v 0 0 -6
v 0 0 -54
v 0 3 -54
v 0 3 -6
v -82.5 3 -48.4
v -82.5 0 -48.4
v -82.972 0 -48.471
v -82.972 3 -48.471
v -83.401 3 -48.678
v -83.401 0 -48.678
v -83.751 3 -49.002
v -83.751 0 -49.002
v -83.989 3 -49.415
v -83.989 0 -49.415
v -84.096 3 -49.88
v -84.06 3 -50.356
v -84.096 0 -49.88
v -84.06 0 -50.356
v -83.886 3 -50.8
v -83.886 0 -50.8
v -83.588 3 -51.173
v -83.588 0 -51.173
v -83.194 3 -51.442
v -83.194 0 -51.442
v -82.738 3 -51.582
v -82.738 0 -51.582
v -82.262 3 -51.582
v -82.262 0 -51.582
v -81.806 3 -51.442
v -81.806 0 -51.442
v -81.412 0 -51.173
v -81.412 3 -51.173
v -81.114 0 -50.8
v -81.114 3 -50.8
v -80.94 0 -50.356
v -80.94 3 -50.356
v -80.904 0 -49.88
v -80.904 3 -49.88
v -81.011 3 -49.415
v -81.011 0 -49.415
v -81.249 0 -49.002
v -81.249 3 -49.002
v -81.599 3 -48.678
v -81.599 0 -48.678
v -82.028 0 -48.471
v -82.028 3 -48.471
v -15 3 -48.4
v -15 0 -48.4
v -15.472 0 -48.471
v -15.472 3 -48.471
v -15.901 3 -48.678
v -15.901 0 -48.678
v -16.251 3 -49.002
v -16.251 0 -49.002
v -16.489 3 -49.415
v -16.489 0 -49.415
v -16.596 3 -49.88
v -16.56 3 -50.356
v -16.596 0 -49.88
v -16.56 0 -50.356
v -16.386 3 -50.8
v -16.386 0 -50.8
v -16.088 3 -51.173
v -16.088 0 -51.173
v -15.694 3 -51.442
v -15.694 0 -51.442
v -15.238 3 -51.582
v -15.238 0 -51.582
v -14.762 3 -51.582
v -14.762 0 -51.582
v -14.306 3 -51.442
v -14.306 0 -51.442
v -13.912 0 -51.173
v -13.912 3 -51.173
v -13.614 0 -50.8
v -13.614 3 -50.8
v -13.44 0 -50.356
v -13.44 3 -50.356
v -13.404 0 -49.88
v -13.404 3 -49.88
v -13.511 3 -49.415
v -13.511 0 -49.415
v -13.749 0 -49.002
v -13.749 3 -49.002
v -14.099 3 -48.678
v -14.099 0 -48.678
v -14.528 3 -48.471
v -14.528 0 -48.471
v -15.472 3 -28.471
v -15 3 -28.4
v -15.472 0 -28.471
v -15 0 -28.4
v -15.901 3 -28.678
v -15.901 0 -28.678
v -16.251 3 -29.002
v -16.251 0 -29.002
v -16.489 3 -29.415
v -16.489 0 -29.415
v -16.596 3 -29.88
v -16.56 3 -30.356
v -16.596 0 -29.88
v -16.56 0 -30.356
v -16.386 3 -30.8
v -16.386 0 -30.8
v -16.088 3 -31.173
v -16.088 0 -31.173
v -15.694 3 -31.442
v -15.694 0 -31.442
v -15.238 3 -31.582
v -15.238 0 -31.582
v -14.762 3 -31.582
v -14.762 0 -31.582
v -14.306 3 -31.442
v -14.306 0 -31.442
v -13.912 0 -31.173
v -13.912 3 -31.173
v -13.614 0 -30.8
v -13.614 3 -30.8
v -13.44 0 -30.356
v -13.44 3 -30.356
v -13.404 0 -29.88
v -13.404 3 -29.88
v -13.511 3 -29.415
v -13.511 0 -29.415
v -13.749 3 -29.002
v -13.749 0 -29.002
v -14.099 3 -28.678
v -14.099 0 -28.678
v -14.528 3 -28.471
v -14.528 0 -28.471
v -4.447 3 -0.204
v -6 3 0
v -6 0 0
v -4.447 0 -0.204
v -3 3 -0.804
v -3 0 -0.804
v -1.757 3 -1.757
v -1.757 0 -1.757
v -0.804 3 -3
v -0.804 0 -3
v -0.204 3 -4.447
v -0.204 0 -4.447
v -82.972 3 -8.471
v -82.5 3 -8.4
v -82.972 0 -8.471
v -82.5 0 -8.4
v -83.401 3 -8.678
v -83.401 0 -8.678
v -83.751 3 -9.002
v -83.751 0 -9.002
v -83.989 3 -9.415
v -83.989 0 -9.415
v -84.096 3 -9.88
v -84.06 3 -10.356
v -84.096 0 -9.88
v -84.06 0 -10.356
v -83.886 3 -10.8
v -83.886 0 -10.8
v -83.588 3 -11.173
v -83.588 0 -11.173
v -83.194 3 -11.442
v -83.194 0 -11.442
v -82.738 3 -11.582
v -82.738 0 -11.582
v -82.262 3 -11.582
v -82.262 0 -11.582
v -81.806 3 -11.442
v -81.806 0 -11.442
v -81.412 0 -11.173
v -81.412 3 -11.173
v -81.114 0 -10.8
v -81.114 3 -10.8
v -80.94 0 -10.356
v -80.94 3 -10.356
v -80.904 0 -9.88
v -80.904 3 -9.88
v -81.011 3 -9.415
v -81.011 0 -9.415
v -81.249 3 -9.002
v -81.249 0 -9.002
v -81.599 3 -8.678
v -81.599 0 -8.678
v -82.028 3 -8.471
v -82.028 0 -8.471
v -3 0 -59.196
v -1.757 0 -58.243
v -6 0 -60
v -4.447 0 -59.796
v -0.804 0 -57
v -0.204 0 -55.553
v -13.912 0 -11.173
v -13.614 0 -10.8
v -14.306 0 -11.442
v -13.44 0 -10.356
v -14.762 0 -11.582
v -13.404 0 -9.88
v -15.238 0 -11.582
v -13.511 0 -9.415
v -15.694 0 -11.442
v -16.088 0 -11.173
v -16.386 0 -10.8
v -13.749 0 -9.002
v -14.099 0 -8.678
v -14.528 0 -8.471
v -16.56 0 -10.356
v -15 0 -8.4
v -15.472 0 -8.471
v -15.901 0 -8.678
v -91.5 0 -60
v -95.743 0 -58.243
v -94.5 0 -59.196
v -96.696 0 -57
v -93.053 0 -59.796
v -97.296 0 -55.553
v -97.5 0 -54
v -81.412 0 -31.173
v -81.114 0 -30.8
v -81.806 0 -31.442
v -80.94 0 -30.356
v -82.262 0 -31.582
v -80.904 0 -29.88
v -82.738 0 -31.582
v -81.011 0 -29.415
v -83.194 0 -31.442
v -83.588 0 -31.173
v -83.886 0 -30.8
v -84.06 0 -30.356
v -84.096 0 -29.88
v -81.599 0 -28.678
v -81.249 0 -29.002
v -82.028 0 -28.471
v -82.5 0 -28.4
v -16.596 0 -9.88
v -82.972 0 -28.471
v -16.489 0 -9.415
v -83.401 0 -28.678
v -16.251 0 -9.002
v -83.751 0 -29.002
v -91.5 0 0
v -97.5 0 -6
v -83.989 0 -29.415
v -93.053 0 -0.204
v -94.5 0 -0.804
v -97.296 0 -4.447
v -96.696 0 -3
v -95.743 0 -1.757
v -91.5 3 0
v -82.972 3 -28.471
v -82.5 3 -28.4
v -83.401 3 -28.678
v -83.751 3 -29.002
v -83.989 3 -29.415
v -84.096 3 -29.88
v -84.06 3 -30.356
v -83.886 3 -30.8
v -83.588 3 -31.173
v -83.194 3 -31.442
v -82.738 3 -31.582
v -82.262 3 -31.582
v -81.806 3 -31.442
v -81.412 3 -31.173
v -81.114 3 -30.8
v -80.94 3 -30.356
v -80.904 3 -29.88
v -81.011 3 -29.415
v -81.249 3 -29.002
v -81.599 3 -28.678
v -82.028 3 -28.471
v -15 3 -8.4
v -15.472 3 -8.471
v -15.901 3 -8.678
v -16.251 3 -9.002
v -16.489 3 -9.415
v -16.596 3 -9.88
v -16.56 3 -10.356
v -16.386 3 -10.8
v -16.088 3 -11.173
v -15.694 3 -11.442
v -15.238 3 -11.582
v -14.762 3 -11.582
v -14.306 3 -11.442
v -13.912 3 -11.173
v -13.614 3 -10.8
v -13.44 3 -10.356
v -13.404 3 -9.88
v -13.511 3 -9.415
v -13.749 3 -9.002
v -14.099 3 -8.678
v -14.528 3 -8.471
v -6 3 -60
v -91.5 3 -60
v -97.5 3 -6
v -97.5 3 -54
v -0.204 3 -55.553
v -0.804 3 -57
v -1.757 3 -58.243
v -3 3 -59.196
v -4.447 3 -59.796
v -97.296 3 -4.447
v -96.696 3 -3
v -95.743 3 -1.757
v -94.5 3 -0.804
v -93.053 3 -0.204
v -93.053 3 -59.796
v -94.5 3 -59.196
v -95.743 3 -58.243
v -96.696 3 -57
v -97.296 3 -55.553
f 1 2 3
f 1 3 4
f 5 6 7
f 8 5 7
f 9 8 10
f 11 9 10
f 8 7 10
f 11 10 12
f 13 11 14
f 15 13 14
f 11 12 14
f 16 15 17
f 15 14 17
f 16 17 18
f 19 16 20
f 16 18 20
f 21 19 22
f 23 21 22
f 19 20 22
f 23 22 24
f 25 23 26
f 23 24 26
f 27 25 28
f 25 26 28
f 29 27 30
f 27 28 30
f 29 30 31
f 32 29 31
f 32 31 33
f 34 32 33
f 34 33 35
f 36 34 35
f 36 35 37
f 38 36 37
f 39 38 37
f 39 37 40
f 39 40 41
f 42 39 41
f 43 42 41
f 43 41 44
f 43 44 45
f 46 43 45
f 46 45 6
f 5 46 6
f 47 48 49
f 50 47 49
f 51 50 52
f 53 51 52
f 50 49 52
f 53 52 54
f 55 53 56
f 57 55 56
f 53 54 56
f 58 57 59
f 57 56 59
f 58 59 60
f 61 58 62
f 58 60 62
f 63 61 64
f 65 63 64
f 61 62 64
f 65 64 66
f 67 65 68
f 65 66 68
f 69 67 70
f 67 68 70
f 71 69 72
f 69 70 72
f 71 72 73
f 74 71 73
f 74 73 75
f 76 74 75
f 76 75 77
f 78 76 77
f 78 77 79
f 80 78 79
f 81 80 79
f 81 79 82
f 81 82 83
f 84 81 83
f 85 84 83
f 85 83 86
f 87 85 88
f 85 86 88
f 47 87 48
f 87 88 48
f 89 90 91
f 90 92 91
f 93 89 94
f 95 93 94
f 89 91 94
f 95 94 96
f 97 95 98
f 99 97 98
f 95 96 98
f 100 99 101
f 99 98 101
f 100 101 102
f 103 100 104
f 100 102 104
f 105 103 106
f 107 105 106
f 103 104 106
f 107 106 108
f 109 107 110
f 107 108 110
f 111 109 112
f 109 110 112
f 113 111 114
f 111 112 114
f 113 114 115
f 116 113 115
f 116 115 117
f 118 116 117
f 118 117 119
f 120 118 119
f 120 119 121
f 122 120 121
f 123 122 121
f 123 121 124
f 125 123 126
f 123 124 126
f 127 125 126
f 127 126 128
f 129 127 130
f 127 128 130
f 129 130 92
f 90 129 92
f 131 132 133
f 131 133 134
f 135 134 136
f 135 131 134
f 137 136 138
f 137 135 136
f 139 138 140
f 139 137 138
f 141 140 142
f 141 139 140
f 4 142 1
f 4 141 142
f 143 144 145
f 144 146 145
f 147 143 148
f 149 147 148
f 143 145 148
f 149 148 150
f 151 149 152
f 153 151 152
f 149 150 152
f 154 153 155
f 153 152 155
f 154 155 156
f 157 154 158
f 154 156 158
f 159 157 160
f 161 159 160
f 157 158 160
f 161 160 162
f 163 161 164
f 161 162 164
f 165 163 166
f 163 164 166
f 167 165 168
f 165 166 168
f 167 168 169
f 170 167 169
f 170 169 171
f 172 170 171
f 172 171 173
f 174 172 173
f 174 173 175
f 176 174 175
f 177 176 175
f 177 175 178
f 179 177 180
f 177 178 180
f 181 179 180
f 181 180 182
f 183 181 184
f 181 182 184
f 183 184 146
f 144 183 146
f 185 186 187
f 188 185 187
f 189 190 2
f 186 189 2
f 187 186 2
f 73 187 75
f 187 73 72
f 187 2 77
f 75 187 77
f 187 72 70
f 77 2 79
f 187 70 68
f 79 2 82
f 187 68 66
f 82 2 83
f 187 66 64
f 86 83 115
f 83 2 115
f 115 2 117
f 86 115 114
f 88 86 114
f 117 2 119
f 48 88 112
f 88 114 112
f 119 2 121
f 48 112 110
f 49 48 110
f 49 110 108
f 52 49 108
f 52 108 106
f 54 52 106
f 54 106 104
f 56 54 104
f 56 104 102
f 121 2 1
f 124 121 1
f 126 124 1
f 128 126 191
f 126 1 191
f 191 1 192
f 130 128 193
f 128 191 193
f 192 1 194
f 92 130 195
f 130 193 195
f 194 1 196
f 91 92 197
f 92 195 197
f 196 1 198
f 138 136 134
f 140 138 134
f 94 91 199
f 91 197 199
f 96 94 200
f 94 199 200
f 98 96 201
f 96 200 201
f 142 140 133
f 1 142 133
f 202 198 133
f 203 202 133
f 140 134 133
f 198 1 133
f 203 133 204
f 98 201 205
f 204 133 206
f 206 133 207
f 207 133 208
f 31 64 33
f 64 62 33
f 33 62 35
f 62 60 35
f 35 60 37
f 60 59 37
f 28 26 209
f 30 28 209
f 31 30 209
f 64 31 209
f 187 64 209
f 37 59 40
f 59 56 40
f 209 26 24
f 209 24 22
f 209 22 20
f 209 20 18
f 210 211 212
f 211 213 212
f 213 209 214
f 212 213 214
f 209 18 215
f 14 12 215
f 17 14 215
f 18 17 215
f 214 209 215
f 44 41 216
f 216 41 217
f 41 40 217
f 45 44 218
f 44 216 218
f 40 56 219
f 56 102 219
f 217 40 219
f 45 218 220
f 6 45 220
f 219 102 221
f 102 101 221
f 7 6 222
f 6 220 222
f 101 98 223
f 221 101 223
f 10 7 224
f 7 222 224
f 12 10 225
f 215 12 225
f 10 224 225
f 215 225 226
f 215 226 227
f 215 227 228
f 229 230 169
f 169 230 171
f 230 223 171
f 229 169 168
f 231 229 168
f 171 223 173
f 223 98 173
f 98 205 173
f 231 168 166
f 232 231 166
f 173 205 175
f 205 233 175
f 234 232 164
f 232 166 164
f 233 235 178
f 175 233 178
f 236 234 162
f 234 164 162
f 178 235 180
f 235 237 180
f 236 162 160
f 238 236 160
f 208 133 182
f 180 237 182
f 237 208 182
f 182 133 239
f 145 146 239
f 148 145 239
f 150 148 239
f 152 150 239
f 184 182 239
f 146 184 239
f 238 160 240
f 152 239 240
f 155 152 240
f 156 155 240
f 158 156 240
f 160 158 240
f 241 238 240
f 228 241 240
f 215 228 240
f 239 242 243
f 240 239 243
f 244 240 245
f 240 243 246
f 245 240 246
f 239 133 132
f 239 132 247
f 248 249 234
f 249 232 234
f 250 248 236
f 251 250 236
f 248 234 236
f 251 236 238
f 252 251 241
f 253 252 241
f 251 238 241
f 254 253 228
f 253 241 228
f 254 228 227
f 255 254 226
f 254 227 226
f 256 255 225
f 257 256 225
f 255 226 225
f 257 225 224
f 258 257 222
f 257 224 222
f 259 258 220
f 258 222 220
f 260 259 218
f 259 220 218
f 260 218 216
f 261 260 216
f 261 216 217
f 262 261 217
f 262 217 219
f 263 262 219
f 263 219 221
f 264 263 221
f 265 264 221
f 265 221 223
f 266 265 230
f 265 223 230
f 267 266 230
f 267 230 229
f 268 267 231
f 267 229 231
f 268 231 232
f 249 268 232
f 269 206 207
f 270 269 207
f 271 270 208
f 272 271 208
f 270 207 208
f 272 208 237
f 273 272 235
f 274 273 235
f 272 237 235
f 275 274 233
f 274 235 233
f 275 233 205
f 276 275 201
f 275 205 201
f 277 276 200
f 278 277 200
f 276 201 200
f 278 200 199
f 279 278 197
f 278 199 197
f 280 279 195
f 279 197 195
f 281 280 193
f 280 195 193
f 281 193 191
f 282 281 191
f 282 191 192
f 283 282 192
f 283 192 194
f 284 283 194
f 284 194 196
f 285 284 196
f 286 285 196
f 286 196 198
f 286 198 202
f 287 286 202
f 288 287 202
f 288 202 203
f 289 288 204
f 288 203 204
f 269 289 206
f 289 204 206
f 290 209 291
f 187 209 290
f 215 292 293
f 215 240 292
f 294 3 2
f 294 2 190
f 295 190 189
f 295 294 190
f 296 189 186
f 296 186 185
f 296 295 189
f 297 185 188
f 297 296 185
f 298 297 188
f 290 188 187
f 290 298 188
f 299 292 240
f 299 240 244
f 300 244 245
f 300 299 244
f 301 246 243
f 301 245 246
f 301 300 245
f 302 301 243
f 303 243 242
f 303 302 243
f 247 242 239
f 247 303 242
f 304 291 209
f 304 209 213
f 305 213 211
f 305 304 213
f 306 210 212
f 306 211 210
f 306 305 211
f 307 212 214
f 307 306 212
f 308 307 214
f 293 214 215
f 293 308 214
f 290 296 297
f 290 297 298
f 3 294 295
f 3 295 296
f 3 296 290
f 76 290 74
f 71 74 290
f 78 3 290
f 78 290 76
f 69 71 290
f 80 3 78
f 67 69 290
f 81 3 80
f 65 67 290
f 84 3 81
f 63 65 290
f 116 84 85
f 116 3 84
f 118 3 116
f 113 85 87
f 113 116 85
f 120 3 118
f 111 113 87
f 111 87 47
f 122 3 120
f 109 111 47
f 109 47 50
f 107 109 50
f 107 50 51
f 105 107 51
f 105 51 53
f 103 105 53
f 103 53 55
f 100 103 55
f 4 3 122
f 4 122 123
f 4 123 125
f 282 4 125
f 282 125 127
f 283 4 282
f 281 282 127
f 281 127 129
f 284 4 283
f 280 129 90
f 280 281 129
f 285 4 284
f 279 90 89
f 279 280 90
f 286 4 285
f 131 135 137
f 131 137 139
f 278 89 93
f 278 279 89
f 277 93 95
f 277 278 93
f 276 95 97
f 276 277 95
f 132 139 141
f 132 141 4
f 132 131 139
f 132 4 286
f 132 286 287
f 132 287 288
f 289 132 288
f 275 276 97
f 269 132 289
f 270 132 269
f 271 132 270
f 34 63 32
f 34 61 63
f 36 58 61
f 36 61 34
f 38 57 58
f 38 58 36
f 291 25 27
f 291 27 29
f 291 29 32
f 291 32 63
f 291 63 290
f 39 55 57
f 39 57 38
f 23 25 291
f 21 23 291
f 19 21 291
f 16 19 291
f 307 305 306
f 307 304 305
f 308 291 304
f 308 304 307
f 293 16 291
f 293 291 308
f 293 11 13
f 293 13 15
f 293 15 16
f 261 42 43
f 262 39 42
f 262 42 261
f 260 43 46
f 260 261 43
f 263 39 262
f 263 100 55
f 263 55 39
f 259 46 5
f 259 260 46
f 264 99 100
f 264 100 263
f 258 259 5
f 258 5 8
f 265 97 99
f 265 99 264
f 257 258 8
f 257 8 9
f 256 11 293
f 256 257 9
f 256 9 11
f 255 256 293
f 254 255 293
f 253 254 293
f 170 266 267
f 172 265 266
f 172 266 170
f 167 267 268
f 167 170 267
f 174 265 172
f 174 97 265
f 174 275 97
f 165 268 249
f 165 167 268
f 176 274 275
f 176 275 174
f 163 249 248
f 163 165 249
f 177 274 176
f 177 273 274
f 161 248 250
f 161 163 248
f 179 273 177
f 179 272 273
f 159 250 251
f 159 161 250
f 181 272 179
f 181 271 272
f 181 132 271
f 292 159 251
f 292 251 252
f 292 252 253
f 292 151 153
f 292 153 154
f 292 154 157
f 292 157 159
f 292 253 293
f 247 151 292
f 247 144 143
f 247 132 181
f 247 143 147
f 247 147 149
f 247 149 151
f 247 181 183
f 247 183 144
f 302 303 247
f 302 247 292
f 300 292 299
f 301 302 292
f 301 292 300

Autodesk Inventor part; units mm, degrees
ref_plane "YZ Plane" through (0, 0, 0) normal (1, 0, 0) x (0, 1, 0)
ref_plane "XZ Plane" through (0, 0, 0) normal (0, 1, 0) x (-1, 0, 0)
ref_plane "XY Plane" through (0, 0, 0) normal (0, 0, 1) x (1, 0, 0)
sketch "スケッチ1" plane through (0, 0, 0) normal (0, 1, 0) x (-1, 0, 0)
  line L0 (0, 0) -> (97.5, 0)
  line L1 (97.5, 0) -> (97.5, -60)
  line L2 (97.5, -60) -> (0, -60)
  line L3 (0, -60) -> (0, 0)
  dimension "d0" = 97.5
  dimension "d1" = 60
extrude "押し出し1" add sketch "スケッチ1" along normal blind 3
sketch "スケッチ2" plane through (0, 3, 0) normal (0, 1, 0) x (1, 0, 0)
  line L0 (0, 0) -> (0, 60) projected
  line L1 (-97.5, 0) -> (0, 0) projected
  line L2 (-97.5, 60) -> (-97.5, 0) projected
  point P0 (-15, 30)
  point P1 (-15, 10)
  point P2 (-15, 50)
  point P3 (-82.5, 30)
  point P4 (-82.5, 10)
  point P5 (-82.5, 50)
  dimension "d4" = 15
  dimension "d5" = 30
  dimension "d6" = 20
  dimension "d7" = 20
  dimension "d8" = 15
  dimension "d9" = 15
  dimension "d10" = 15
  dimension "d11" = 15
  dimension "d12" = 15
  dimension "d13" = 20
  dimension "d14" = 20
  dimension "d15" = 30
hole "穴1" at (-15, 3, -30) at (-15, 3, -10) at (-15, 3, -50) at (-82.5, 3, -30) at (-82.5, 3, -10) at (-82.5, 3, -50) direction (0, -1, 0) diameter 3.2 end through all
fillet "フィレット1" radius 6 4 edges at (-97.5, 1.5, 0) (0, 1.5, 0) (-97.5, 1.5, -60) (0, 1.5, -60)
properties part number "足回り_固定"
